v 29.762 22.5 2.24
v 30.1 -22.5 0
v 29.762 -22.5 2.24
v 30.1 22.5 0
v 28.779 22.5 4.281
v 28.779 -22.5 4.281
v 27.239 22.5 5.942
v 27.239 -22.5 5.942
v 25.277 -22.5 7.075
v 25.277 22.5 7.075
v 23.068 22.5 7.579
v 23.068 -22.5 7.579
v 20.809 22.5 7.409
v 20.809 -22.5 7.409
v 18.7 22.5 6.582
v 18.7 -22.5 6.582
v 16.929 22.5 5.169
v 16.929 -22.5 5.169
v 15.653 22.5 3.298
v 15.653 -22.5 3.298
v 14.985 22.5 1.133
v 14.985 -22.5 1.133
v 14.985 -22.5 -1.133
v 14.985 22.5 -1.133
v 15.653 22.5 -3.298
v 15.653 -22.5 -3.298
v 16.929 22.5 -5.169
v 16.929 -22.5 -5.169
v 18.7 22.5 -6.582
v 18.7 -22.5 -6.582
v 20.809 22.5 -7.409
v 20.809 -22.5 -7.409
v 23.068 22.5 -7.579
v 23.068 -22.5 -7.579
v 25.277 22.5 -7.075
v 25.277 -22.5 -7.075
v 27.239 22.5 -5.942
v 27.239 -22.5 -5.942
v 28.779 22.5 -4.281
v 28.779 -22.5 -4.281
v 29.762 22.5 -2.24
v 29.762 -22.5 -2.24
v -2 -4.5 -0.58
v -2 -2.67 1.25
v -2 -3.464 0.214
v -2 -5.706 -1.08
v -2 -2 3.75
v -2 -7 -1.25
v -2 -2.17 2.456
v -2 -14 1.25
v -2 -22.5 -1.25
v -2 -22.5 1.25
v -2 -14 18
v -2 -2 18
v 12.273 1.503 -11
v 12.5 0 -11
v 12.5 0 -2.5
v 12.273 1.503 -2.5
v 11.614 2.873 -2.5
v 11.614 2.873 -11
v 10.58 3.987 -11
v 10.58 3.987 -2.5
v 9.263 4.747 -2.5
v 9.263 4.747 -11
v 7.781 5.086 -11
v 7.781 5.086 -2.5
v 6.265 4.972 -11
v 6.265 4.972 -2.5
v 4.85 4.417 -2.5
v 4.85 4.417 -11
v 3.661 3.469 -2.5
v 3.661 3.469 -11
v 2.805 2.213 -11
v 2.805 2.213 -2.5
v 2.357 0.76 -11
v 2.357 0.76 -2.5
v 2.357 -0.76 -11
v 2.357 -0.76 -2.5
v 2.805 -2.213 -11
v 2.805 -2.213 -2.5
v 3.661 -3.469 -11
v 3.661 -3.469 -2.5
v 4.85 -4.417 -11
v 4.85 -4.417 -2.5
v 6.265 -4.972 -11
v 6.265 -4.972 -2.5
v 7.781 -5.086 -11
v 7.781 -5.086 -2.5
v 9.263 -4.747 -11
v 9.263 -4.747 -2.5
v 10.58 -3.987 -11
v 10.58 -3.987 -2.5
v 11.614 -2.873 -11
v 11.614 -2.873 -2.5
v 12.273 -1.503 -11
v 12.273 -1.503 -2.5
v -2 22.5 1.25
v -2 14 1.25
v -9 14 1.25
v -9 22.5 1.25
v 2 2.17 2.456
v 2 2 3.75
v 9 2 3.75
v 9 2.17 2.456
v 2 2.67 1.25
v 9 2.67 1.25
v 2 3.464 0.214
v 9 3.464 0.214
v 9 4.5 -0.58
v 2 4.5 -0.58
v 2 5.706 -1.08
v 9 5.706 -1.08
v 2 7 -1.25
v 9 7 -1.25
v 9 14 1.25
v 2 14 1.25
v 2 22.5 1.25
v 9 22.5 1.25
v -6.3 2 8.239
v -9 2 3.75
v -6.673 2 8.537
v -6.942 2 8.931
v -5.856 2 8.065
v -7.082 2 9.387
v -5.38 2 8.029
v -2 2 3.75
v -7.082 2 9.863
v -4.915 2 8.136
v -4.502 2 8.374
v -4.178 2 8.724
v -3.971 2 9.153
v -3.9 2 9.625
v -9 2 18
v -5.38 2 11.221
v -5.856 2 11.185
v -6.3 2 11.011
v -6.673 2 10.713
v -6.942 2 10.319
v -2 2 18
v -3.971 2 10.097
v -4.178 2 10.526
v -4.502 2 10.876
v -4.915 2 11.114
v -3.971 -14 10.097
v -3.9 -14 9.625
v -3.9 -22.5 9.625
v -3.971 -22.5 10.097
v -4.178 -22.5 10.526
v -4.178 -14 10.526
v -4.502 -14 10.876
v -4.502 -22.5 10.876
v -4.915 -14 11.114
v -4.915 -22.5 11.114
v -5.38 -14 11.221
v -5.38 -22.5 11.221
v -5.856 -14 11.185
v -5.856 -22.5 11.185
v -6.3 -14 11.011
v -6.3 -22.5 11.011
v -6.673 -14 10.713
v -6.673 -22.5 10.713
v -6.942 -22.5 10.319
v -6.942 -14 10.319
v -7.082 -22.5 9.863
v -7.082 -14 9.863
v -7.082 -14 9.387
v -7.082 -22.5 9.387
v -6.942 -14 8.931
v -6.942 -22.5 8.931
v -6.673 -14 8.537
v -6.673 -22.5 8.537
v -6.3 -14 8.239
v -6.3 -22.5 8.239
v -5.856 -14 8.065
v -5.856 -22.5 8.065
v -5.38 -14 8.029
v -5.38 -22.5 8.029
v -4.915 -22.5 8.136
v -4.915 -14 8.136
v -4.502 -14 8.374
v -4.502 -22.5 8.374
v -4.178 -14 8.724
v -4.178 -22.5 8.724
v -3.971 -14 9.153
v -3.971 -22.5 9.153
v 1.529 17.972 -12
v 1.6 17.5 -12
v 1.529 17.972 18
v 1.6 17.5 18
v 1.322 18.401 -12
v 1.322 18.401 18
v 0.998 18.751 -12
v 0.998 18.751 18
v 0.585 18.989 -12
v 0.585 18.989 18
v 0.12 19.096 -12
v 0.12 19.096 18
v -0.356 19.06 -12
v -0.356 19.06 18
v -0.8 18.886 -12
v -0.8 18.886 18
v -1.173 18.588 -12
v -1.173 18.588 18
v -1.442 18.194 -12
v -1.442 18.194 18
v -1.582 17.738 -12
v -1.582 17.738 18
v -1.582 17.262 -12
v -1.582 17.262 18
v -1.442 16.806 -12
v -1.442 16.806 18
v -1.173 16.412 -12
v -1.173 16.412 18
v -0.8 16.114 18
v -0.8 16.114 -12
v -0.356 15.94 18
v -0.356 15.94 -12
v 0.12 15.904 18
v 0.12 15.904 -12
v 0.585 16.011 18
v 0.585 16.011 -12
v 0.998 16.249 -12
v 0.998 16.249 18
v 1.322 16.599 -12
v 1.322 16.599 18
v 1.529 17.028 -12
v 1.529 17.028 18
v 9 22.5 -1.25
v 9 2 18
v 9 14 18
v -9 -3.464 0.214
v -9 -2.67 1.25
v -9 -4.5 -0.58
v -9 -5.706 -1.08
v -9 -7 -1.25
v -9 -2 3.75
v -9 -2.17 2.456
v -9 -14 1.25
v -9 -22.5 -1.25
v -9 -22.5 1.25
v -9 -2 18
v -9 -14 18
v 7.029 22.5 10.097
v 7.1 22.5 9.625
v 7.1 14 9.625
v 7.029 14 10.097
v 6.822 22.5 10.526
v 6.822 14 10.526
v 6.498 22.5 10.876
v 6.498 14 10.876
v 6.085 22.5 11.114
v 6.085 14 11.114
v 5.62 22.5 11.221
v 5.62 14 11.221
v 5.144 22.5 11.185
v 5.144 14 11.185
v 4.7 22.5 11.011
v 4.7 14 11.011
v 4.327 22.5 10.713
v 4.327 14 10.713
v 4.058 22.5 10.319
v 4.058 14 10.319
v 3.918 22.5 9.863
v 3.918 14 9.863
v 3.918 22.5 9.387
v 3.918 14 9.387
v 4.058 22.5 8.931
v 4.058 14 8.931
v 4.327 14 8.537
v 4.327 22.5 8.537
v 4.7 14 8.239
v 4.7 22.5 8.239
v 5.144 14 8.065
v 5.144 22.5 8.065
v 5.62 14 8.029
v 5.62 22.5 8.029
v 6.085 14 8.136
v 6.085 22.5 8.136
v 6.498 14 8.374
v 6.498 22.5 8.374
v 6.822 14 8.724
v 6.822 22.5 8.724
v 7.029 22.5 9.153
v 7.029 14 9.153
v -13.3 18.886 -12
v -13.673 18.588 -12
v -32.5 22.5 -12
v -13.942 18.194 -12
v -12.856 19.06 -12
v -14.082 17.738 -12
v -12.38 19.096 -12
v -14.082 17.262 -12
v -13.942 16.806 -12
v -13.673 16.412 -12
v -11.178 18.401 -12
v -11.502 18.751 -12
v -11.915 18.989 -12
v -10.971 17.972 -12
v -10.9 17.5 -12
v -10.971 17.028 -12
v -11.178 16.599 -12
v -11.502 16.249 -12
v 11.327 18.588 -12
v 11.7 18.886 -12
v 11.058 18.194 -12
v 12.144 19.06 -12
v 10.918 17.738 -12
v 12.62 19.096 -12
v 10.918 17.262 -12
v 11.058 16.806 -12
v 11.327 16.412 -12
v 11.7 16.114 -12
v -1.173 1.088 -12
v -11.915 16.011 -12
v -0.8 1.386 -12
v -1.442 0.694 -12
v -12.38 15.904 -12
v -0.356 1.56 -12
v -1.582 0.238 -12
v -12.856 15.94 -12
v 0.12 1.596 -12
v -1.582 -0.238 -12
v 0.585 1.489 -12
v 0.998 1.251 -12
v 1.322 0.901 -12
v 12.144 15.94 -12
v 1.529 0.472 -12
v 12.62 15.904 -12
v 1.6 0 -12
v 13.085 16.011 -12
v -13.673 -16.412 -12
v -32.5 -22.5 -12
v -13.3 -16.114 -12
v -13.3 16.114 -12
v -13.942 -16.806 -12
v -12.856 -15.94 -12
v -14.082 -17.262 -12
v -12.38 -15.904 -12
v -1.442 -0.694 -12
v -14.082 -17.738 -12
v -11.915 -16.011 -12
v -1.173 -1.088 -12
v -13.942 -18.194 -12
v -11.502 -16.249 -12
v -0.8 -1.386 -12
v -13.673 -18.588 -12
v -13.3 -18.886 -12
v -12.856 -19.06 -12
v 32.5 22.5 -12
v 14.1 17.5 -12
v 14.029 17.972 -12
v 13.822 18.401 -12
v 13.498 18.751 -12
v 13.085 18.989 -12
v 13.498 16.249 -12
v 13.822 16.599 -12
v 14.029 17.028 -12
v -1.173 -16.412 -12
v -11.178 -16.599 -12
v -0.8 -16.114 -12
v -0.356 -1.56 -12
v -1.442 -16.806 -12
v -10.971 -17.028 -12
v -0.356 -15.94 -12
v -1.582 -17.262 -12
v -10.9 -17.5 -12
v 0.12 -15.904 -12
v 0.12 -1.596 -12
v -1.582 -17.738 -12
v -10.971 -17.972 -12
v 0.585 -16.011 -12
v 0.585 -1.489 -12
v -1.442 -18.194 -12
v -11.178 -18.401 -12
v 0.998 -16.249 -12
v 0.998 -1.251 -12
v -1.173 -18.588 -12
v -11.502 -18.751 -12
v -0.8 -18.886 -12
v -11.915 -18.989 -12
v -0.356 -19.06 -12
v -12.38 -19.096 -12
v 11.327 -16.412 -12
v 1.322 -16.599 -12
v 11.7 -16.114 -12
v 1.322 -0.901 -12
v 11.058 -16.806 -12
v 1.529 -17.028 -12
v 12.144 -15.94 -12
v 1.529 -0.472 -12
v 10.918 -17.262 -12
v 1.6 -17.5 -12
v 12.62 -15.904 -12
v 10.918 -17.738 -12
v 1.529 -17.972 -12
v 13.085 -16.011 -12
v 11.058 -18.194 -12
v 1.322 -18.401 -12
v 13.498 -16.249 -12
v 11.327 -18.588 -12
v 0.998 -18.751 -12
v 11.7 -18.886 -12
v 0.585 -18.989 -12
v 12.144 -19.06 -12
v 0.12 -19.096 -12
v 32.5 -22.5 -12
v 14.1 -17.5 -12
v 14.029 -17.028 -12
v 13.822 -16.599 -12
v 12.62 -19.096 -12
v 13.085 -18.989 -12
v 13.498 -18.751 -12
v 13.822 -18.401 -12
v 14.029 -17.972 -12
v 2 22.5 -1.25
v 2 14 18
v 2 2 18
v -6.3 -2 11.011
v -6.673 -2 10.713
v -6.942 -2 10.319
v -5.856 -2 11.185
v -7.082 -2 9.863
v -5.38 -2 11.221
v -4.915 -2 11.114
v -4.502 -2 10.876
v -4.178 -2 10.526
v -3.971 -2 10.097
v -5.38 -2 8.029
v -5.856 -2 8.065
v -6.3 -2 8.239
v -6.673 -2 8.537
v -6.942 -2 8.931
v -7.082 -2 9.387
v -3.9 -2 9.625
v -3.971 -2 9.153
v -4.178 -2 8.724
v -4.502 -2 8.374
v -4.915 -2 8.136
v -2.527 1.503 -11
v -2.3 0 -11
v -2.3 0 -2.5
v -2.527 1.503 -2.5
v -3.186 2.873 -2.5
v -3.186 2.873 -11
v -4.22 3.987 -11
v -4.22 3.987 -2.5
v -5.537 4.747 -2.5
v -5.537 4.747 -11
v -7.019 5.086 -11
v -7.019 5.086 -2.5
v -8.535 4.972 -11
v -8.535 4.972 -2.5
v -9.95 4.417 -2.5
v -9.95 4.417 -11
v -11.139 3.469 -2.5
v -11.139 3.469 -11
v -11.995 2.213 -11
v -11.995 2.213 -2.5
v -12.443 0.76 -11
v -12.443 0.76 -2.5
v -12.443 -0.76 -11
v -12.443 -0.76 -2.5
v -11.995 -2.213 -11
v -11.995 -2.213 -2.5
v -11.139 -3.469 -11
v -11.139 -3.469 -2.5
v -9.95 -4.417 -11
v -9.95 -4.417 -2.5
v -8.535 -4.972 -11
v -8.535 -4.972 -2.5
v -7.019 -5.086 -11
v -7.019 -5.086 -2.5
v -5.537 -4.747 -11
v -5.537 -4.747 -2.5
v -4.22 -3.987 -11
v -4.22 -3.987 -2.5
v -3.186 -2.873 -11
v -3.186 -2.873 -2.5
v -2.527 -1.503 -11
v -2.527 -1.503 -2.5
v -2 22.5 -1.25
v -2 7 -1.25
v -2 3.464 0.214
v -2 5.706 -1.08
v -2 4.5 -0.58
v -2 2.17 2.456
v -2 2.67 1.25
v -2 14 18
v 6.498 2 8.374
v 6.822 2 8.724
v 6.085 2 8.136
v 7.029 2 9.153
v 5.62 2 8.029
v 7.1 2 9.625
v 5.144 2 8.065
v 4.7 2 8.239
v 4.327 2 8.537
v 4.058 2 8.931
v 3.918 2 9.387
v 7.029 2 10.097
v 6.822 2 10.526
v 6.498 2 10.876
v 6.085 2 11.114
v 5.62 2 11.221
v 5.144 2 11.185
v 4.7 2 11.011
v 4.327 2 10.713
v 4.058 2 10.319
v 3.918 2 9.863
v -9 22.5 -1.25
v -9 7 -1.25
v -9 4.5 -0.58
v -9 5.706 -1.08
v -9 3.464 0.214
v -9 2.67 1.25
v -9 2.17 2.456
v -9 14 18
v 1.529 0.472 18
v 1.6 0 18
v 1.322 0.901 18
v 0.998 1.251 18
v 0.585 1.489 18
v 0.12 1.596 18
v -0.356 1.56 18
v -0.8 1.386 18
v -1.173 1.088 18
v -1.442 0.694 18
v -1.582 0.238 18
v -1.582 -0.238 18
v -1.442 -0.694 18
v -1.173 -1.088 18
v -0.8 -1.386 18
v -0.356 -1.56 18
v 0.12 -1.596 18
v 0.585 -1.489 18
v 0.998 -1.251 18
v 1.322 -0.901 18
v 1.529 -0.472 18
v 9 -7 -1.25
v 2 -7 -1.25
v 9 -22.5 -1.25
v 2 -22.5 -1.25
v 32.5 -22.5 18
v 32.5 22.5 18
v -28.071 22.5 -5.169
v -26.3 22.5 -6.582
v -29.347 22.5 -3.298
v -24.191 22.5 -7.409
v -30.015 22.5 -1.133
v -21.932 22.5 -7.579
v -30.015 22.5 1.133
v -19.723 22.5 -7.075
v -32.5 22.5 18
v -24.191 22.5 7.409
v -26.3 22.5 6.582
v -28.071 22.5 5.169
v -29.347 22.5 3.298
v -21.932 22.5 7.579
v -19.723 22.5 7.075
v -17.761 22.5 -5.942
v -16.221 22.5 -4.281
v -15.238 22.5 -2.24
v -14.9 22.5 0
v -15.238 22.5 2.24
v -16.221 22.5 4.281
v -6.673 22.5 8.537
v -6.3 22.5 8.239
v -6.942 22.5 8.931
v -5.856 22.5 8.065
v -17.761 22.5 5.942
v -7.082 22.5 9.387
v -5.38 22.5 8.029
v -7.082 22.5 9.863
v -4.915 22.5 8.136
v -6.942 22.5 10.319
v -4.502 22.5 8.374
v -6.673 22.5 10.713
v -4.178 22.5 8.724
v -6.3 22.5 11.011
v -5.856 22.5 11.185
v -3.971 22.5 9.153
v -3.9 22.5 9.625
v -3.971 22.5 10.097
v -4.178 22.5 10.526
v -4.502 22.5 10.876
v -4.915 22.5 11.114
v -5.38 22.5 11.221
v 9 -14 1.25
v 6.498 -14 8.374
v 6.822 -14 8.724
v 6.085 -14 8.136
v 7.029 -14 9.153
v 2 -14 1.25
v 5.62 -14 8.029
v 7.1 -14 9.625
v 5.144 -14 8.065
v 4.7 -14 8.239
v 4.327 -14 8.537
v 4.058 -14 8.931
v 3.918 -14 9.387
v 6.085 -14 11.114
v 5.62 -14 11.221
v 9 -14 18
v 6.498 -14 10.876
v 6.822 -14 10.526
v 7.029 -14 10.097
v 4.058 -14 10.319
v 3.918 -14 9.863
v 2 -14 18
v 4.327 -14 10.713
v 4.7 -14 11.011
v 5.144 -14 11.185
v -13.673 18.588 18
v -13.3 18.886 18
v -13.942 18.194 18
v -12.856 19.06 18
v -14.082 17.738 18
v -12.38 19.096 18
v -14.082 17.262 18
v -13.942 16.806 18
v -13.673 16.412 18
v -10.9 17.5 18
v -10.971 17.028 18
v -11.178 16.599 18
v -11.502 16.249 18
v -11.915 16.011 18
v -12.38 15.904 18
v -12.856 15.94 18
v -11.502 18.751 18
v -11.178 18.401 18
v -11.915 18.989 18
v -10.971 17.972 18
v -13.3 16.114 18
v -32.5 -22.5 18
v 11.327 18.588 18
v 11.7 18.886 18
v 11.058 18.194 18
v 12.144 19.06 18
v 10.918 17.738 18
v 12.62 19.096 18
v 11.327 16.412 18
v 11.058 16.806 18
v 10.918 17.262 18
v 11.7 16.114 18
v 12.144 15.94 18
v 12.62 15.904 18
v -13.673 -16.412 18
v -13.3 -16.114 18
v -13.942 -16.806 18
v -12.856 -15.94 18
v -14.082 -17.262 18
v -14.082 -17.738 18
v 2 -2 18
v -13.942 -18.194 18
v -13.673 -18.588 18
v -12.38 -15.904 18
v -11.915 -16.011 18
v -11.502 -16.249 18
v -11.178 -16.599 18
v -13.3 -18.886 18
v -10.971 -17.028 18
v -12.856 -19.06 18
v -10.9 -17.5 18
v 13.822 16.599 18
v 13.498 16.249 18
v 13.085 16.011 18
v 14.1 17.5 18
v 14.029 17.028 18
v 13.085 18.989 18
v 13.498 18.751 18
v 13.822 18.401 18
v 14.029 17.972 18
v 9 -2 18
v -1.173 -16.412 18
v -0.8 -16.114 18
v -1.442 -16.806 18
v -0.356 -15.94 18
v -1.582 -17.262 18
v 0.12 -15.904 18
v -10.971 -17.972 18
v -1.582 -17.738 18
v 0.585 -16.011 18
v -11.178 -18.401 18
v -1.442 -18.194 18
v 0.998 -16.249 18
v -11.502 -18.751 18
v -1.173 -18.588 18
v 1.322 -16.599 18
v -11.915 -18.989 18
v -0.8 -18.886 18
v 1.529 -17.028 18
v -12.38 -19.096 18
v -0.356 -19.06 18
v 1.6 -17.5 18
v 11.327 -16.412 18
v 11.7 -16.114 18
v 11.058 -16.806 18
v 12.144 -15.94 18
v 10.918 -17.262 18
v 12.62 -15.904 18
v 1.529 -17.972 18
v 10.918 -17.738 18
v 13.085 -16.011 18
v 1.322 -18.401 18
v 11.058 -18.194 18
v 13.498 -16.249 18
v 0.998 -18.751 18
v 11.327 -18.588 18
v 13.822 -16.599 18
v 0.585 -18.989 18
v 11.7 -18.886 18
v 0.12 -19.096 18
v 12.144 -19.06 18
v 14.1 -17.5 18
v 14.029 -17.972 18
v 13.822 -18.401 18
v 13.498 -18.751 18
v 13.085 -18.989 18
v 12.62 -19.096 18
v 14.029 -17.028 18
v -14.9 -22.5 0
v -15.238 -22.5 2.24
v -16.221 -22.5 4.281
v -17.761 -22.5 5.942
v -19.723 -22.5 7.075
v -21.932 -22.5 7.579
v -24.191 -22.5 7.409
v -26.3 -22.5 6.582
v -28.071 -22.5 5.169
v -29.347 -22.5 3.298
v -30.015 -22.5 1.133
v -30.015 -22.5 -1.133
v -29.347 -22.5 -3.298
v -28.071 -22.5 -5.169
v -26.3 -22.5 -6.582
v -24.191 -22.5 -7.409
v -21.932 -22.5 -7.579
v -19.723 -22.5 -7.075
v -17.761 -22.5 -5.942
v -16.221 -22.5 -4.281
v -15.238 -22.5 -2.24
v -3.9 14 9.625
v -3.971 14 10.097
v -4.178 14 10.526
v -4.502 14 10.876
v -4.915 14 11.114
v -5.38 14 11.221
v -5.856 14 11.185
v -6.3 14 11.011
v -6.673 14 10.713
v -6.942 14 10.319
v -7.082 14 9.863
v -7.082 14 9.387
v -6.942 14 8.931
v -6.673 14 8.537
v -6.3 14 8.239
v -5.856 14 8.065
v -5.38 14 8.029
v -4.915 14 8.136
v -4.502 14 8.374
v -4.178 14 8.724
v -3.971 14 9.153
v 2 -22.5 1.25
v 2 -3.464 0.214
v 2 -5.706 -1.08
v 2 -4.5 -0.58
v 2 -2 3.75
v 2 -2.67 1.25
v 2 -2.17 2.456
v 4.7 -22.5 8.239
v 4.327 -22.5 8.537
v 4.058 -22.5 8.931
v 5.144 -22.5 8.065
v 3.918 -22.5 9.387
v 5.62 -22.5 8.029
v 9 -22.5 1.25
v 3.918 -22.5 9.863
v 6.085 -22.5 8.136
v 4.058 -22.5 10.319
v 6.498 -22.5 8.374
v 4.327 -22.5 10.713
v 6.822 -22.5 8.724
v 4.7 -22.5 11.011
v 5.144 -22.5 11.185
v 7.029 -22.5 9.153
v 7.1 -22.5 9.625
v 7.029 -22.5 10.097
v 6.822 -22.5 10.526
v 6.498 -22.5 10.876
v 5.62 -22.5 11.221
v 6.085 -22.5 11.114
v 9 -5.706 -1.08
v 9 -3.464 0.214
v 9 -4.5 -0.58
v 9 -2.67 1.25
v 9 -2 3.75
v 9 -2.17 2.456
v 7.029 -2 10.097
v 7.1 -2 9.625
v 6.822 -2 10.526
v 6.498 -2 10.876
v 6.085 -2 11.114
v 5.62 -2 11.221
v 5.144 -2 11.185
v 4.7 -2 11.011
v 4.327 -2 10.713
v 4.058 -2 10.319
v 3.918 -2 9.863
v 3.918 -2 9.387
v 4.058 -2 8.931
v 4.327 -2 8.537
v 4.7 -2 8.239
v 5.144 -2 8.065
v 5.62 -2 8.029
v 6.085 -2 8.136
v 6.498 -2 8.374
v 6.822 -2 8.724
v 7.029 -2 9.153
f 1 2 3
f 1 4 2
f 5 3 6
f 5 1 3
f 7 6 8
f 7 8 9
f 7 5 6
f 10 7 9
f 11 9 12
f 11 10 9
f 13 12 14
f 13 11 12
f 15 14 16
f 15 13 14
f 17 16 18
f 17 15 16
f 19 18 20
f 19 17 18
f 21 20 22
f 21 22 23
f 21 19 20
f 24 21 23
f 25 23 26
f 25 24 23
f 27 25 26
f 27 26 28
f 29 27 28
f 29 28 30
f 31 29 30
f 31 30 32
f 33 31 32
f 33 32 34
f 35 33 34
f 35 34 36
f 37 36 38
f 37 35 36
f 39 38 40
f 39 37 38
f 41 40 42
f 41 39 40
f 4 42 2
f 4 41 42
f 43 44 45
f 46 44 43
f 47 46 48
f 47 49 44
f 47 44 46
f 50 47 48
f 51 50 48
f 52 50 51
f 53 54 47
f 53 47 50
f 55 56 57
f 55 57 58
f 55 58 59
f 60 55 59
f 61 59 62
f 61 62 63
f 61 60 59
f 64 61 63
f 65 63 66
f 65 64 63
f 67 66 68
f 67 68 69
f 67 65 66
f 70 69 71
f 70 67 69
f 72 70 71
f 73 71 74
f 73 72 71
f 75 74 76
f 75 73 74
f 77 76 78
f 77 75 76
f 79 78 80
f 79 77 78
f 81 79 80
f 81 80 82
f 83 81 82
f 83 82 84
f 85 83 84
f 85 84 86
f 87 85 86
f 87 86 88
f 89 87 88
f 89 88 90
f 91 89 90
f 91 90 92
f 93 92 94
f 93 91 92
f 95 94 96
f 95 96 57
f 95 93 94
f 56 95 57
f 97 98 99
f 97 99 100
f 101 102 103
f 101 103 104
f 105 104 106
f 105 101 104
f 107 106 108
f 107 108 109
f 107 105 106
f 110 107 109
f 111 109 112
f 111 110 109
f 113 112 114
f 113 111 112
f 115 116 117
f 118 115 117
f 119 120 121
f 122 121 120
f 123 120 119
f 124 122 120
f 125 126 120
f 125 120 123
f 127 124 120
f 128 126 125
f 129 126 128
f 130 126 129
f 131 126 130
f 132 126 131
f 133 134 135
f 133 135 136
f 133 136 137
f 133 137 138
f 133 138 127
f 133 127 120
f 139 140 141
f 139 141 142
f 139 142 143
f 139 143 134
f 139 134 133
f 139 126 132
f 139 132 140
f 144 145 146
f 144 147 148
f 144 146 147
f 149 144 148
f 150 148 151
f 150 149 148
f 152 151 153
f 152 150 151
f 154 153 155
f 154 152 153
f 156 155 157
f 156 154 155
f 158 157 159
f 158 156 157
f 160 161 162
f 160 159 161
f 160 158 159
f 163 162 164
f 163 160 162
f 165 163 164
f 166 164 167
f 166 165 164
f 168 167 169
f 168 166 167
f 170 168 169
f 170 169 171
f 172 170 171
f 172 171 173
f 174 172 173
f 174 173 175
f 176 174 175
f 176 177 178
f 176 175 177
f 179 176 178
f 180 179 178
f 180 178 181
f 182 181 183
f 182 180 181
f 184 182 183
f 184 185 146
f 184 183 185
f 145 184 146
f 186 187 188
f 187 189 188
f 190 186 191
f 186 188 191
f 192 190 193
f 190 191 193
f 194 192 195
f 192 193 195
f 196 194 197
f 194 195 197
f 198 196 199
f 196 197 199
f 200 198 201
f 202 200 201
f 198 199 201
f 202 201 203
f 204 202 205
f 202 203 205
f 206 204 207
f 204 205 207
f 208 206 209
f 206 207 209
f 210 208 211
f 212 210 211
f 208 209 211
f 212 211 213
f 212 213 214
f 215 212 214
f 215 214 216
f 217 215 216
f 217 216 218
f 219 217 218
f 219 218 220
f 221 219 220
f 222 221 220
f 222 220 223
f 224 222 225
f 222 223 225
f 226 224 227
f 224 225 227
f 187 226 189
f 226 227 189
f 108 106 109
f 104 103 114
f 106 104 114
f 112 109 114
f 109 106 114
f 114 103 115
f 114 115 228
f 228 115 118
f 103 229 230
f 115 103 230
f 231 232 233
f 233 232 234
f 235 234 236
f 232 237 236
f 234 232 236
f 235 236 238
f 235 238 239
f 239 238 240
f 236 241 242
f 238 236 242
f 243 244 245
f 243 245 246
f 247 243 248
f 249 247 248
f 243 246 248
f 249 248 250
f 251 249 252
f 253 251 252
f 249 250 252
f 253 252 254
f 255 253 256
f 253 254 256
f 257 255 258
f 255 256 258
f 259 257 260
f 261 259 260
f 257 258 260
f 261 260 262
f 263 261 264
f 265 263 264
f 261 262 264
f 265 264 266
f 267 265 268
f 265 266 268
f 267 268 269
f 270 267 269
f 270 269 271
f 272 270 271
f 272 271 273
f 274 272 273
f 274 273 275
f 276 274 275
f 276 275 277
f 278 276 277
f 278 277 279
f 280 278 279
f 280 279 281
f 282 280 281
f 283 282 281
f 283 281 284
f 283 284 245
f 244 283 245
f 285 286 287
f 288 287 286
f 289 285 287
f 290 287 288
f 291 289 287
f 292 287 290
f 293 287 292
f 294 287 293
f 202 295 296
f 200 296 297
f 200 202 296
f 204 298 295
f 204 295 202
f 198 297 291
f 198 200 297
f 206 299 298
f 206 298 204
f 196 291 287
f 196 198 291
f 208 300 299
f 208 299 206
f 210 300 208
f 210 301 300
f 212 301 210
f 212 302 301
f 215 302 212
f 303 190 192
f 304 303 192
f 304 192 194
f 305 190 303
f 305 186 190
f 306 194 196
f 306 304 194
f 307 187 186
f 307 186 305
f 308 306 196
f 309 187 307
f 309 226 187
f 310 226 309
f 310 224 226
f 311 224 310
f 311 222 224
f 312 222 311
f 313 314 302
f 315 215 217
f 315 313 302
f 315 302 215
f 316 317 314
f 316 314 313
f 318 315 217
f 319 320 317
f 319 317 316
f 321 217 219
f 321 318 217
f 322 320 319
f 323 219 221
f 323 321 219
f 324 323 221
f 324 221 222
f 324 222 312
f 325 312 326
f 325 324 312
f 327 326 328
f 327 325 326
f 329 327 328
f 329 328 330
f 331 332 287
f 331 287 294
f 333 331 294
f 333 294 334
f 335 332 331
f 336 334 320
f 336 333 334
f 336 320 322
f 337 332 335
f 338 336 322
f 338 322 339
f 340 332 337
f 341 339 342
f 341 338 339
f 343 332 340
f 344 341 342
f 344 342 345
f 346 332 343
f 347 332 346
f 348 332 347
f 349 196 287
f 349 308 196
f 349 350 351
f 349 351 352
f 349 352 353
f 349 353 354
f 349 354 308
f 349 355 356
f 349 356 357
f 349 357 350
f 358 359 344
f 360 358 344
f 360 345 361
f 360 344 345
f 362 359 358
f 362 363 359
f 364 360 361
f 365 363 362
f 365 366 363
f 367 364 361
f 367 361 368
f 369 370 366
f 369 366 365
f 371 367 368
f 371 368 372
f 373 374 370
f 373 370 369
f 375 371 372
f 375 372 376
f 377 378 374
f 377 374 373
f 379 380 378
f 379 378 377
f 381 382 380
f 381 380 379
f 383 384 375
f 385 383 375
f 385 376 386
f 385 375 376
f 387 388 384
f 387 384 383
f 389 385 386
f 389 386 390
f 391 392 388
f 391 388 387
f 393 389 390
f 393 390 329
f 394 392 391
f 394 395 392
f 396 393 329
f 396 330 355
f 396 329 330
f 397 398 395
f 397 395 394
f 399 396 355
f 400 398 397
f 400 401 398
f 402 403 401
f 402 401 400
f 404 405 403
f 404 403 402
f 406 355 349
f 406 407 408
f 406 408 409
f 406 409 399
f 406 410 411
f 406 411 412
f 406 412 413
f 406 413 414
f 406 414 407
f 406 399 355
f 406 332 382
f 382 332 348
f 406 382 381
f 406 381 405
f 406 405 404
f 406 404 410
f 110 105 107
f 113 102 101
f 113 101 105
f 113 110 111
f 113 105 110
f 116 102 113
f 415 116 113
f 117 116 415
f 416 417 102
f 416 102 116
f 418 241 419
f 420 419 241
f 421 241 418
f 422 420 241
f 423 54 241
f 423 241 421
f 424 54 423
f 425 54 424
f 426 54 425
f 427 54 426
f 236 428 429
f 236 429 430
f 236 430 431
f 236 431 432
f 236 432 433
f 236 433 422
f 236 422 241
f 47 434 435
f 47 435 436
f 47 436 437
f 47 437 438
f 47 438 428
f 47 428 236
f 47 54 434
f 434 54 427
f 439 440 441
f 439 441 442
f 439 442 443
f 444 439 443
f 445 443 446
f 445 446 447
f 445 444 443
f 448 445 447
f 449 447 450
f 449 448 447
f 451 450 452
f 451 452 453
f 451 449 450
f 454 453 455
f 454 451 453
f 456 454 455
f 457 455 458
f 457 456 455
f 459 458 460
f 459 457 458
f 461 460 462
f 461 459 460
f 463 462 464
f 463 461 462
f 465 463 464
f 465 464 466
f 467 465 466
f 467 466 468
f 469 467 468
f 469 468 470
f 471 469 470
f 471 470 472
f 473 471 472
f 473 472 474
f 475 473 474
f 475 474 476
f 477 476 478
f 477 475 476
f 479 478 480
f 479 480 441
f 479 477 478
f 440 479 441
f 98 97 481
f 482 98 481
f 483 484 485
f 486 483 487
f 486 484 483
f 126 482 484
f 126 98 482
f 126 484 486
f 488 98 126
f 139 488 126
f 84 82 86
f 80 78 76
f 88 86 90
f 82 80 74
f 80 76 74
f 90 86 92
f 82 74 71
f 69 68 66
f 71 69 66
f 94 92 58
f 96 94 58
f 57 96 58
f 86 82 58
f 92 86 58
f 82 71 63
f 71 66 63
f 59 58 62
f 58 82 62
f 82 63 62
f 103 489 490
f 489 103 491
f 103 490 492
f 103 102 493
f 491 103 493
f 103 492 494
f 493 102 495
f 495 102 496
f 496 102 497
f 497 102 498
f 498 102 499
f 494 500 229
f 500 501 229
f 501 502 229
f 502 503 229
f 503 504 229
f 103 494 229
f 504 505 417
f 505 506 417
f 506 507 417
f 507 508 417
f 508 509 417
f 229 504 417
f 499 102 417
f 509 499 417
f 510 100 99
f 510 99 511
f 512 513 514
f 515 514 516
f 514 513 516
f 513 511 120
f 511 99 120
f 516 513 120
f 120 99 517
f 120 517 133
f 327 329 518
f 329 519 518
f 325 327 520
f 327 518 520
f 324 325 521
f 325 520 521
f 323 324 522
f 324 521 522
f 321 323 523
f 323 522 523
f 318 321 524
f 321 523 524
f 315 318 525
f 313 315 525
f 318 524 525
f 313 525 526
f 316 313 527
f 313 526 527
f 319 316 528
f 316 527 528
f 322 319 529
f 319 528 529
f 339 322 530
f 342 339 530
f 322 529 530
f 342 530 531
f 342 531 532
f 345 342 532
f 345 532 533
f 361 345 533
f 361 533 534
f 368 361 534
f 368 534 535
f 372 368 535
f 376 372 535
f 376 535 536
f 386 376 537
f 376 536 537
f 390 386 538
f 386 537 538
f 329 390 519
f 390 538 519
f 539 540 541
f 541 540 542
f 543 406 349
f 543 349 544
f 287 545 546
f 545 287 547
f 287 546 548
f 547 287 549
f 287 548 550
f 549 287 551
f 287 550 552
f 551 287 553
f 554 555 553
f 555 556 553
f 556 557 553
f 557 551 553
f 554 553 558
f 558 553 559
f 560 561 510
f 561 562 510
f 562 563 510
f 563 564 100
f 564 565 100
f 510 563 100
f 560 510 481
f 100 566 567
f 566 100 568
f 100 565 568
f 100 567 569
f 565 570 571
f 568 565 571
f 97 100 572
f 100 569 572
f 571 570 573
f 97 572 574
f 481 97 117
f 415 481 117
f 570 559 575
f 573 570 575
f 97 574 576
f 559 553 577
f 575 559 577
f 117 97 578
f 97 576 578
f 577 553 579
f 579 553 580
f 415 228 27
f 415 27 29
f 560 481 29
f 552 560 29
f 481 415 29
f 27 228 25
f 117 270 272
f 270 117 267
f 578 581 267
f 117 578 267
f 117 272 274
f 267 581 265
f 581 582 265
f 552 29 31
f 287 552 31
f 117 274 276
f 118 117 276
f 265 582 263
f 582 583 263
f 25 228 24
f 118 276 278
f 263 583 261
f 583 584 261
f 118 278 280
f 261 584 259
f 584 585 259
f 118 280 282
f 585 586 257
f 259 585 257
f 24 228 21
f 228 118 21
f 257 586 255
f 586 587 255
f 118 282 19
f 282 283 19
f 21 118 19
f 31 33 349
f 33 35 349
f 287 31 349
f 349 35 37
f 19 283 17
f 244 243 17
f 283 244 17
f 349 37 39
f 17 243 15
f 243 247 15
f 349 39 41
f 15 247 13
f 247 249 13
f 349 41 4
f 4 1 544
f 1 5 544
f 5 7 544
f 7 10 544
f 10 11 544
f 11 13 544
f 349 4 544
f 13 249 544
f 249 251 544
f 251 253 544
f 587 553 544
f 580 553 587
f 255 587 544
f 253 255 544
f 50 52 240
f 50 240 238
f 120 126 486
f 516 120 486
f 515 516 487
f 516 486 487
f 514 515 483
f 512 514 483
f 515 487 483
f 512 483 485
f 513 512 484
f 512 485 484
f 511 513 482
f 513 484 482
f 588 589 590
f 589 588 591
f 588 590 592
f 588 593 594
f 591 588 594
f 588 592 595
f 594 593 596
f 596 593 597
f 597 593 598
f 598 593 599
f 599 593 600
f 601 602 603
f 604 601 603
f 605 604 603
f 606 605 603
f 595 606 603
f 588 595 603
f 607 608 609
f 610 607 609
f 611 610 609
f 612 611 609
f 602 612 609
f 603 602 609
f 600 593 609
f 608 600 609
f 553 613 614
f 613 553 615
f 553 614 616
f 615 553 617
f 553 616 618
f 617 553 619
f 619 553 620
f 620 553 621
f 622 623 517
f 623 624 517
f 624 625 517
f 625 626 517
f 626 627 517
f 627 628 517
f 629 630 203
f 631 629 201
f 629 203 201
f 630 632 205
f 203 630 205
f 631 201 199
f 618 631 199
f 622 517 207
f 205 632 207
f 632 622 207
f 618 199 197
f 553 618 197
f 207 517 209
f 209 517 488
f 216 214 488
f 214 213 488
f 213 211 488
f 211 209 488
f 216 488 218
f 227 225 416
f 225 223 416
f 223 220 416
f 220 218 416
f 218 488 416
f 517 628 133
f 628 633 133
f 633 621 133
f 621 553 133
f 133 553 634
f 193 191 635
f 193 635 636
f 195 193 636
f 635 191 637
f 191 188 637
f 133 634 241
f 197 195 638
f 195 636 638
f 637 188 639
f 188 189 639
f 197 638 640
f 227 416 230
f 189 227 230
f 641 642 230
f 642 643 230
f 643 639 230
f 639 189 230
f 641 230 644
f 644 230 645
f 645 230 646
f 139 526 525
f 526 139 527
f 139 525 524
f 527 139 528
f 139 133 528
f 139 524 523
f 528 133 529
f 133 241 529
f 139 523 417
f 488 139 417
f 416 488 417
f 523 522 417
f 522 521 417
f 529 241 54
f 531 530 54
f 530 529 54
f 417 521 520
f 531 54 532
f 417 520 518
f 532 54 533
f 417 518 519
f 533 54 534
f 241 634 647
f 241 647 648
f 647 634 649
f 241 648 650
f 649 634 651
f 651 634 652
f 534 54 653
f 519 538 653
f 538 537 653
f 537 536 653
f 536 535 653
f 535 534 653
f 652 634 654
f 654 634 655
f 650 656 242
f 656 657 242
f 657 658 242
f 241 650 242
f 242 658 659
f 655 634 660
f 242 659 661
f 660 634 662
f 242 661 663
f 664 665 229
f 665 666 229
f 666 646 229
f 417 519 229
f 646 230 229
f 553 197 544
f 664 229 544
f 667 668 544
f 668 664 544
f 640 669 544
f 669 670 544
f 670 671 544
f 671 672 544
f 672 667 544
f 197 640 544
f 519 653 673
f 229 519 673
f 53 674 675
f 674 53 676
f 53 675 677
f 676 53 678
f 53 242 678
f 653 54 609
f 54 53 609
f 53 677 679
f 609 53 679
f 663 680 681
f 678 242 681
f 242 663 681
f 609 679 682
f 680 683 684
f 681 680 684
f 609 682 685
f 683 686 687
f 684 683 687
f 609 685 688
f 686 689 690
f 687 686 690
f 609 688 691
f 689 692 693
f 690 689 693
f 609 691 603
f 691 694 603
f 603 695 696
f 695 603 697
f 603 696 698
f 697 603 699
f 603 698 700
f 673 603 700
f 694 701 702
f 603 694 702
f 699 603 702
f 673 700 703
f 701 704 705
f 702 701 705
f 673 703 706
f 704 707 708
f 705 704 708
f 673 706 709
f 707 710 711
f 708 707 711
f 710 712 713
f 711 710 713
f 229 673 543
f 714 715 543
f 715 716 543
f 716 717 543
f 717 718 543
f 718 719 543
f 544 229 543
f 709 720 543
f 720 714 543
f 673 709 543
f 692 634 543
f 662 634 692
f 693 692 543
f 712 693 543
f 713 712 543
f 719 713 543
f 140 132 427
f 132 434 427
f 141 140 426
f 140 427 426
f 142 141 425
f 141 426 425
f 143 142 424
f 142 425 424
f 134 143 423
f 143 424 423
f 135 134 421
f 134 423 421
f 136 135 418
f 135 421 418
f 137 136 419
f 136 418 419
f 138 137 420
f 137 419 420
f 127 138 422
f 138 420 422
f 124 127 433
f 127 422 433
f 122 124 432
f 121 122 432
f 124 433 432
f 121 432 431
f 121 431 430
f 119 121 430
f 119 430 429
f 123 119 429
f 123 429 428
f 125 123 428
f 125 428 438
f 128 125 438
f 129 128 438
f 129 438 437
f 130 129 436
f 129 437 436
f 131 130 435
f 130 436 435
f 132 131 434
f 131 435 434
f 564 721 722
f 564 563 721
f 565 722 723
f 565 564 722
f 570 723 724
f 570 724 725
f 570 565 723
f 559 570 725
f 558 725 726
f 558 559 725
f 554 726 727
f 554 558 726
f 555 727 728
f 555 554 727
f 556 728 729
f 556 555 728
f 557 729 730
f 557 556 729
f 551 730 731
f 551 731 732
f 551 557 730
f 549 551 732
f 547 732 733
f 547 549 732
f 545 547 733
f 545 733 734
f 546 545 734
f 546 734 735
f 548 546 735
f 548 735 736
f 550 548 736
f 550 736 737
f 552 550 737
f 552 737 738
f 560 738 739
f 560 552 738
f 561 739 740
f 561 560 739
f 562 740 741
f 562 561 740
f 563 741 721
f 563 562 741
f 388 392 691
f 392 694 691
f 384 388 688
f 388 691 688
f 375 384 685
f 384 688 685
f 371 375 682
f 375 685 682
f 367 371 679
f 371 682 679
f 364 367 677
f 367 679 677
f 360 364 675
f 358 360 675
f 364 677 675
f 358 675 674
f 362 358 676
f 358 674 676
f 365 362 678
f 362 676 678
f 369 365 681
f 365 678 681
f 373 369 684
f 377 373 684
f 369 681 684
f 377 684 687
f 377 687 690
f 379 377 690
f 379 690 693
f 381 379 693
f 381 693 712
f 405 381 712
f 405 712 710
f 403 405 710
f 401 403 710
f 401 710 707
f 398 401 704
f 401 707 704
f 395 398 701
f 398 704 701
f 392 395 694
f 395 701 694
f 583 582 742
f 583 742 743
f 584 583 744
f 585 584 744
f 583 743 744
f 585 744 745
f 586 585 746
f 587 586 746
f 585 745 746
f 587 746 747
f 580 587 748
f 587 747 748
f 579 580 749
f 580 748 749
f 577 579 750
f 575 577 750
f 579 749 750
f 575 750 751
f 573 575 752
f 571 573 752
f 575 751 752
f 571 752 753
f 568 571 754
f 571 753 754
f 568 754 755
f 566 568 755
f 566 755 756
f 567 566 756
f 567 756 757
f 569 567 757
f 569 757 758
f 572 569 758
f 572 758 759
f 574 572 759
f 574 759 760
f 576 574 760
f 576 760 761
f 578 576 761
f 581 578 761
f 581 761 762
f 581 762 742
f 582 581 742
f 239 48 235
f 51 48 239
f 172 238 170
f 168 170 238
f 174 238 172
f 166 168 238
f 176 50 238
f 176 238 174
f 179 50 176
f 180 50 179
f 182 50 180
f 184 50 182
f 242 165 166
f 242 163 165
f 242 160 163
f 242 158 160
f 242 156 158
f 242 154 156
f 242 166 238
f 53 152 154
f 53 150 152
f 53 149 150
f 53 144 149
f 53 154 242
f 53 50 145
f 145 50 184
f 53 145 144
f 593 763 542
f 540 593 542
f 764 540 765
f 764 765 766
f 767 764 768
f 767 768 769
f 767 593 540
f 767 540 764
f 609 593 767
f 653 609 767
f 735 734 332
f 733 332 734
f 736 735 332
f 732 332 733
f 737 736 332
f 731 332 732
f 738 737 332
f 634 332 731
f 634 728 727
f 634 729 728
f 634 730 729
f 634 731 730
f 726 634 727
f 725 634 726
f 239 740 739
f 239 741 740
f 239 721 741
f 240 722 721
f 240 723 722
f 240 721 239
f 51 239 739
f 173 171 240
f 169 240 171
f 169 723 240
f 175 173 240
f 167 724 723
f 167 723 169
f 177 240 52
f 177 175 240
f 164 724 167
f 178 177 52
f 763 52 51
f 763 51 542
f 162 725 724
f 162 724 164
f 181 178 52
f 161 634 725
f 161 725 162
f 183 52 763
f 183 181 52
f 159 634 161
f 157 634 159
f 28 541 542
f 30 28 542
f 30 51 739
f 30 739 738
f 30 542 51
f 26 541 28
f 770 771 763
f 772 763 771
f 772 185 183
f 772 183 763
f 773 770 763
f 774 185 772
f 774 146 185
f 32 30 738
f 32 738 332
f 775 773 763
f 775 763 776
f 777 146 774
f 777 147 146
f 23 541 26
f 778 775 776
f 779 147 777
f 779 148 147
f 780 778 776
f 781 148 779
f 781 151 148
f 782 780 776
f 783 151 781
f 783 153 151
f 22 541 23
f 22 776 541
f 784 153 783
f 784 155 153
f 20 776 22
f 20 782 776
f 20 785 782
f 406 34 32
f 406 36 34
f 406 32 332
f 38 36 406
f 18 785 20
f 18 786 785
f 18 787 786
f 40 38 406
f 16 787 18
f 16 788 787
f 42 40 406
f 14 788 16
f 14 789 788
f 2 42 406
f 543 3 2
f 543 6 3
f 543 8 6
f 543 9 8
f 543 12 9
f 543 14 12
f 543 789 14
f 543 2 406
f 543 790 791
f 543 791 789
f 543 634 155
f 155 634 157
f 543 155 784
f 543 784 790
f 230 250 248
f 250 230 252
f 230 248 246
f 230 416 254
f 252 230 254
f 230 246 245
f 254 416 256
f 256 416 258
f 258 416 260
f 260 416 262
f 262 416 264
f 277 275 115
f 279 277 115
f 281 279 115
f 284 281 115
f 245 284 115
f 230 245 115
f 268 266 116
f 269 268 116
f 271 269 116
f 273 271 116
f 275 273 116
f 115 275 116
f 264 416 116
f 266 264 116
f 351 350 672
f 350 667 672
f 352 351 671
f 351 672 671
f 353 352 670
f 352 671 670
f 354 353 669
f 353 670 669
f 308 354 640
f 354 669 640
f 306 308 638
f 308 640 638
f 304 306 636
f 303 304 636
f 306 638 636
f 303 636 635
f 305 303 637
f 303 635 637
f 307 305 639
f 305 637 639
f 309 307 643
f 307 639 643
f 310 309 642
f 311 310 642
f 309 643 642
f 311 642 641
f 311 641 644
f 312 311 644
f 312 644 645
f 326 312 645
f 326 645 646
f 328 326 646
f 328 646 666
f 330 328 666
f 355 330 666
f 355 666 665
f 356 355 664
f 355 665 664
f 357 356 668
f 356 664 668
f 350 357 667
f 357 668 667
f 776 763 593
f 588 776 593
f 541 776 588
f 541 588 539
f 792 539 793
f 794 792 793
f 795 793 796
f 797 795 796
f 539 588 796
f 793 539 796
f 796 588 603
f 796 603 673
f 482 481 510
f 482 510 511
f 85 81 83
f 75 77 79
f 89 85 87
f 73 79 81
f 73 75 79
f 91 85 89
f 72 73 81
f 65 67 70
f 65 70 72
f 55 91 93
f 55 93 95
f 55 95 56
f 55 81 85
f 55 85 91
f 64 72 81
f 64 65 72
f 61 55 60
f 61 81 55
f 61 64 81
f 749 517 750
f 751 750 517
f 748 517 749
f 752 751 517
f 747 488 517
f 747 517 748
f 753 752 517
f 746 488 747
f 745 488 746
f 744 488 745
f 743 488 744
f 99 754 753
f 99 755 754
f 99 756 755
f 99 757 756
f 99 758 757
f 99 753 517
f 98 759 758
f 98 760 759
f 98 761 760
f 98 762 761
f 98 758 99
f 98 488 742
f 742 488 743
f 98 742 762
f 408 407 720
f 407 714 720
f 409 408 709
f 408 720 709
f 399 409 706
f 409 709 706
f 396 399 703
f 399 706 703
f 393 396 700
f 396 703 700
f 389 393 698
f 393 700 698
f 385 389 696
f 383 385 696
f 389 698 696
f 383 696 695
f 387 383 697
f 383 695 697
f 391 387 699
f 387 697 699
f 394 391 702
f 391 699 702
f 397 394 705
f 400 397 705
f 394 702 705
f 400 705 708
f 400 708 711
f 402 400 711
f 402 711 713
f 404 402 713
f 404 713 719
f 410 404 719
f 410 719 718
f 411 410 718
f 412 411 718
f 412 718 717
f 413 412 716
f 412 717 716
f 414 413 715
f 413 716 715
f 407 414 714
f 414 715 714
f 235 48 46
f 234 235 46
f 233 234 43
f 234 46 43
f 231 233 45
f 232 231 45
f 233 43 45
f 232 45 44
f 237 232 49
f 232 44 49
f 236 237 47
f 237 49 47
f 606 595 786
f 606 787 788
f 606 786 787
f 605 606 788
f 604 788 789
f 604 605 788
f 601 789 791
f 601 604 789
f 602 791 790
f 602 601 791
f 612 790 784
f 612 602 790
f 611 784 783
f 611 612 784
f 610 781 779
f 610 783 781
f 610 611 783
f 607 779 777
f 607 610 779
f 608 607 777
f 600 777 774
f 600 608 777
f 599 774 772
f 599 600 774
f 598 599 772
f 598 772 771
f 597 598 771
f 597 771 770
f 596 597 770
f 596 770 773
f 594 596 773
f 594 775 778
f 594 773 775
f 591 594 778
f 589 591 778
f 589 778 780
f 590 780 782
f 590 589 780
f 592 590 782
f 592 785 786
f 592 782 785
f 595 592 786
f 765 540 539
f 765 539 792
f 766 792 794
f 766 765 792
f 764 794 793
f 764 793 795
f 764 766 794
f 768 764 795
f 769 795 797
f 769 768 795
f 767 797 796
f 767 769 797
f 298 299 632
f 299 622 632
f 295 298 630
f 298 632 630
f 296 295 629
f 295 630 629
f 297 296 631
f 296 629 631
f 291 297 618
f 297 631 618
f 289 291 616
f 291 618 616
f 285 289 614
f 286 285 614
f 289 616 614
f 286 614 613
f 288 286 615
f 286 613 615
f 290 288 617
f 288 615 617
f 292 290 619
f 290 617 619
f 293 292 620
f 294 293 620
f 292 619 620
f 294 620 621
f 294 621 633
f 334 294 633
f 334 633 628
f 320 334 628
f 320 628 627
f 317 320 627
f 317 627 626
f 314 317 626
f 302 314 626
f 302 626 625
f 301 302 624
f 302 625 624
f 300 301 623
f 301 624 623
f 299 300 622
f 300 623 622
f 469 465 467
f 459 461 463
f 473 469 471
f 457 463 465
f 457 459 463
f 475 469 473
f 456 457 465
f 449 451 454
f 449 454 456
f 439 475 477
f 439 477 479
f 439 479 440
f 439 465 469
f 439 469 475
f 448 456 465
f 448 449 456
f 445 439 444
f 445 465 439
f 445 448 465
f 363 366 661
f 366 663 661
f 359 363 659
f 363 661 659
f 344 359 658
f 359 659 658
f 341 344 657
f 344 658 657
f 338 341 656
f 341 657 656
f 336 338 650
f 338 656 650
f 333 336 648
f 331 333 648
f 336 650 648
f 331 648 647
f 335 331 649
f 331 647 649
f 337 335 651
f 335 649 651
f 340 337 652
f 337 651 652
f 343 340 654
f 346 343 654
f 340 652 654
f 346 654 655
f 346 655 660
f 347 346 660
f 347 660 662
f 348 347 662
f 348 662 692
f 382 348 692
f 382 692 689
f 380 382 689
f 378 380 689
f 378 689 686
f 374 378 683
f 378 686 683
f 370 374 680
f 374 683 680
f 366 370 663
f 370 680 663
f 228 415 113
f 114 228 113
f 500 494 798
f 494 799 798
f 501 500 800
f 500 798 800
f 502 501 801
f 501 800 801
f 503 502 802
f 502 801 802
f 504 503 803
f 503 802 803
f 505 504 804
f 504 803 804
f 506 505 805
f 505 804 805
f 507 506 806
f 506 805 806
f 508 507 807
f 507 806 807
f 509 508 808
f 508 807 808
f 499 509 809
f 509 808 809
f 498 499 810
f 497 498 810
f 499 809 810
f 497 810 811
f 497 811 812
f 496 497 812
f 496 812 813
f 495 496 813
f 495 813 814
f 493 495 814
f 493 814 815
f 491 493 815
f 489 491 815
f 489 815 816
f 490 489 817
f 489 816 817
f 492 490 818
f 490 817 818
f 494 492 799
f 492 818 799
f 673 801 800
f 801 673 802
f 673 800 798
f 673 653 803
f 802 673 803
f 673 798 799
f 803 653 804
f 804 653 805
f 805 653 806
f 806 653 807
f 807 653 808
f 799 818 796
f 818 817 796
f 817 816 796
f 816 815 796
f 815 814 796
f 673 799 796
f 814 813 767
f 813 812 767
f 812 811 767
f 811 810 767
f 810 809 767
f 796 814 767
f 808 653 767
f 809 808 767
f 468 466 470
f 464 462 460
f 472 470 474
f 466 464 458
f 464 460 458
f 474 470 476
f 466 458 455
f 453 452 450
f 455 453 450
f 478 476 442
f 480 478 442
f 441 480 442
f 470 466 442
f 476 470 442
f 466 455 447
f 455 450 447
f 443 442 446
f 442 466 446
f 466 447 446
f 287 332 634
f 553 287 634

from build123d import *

# Parameters (mm, degrees)
SKETCH_W             = 65
SKETCH_H             = 30
SKETCH_R             = 7.6
PAD_DEPTH            = 22.5
SKETCH001_R          = 1.6
POCKET_DEPTH         = 12.001
POCKET_DEPTH_BACK    = -18.001
POCKET001_DEPTH      = 7
POCKET002_DEPTH      = 7
SKETCH004_R          = 5.1
POCKET003_DEPTH      = 8.5
SKETCH005_R          = 1.6
POCKET004_DEPTH      = 22.501
POCKET004_DEPTH_BACK = -22.501


with BuildPart() as part:
    # Sketch → Pad (new body, symmetric)
    with BuildSketch(Plane.XZ):
        with Locations((0, 3)):
            Rectangle(SKETCH_W, SKETCH_H)
        with Locations((-22.5, 0)):
            Circle(SKETCH_R, mode=Mode.SUBTRACT)
        with Locations((22.5, 0)):
            Circle(SKETCH_R, mode=Mode.SUBTRACT)
    extrude(amount=PAD_DEPTH, both=True)

    # Sketch001 → Pocket (cut, two sides)
    with BuildSketch(Plane.XY) as pocket_sk:
        with Locations((-12.5, 17.5)):
            Circle(SKETCH001_R)
        with Locations((12.5, 17.5)):
            Circle(SKETCH001_R)
        Circle(SKETCH001_R)
        with Locations((-12.5, -17.5)):
            Circle(SKETCH001_R)
        with Locations((12.5, -17.5)):
            Circle(SKETCH001_R)
        with Locations((0, 17.5)):
            Circle(SKETCH001_R)
        with Locations((0, -17.5)):
            Circle(SKETCH001_R)
    extrude(amount=-POCKET_DEPTH, mode=Mode.SUBTRACT)
    extrude(pocket_sk.sketch, amount=-POCKET_DEPTH_BACK, mode=Mode.SUBTRACT)

    # Sketch002 (on DatumPlane) → Pocket001 (cut)
    with BuildSketch(Plane.YZ.offset(2)):
        with BuildLine():
            ThreePointArc((-7, -1.25), (-3.464466, 0.214466), (-2, 3.75))
            Line((-2, 18), (-2, 3.75))
            Line((-14, 18), (-2, 18))
            Line((-14, 1.25), (-14, 18))
            Line((-22.5, 1.25), (-14, 1.25))
            Line((-22.5, -1.25), (-22.5, 1.25))
            Line((-7, -1.25), (-22.5, -1.25))
        make_face()
        with BuildLine():
            ThreePointArc((2, 3.75), (3.464466, 0.214466), (7, -1.25))
            Line((22.5, -1.25), (7, -1.25))
            Line((22.5, 1.25), (22.5, -1.25))
            Line((14, 1.25), (22.5, 1.25))
            Line((14, 18), (14, 1.25))
            Line((2, 18), (14, 18))
            Line((2, 3.75), (2, 18))
        make_face()
    extrude(amount=POCKET001_DEPTH, mode=Mode.SUBTRACT)

    # Sketch003 (on DatumPlane) → Pocket002 (cut)
    with BuildSketch(Plane.YZ.offset(-2)):
        with BuildLine():
            Line((-7, -1.25), (-22.5, -1.25))
            Line((-22.5, -1.25), (-22.5, 1.25))
            Line((-22.5, 1.25), (-14, 1.25))
            Line((-14, 1.25), (-14, 18))
            Line((-14, 18), (-2, 18))
            Line((-2, 18), (-2, 3.75))
            ThreePointArc((-7, -1.25), (-3.464466, 0.214466), (-2, 3.75))
        make_face()
        with BuildLine():
            Line((2, 3.75), (2, 18))
            Line((2, 18), (14, 18))
            Line((14, 18), (14, 1.25))
            Line((14, 1.25), (22.5, 1.25))
            Line((22.5, 1.25), (22.5, -1.25))
            Line((22.5, -1.25), (7, -1.25))
            ThreePointArc((2, 3.75), (3.464466, 0.214466), (7, -1.25))
        make_face()
    extrude(amount=-POCKET002_DEPTH, mode=Mode.SUBTRACT)

    # Sketch004 (on DatumPlane) → Pocket003 (cut)
    with BuildSketch(Plane.XY.offset(-11)):
        with Locations((-7.4, 0)):
            Circle(SKETCH004_R)
        with Locations((7.4, 0)):
            Circle(SKETCH004_R)
    extrude(amount=POCKET003_DEPTH, mode=Mode.SUBTRACT)

    # Sketch005 → Pocket004 (cut, two sides)
    with BuildSketch(Plane.XZ) as pocket004_sk:
        with Locations((-5.5, 9.625)):
            Circle(SKETCH005_R)
        with Locations((5.5, 9.625)):
            Circle(SKETCH005_R)
    extrude(amount=-POCKET004_DEPTH, mode=Mode.SUBTRACT)
    extrude(pocket004_sk.sketch, amount=-POCKET004_DEPTH_BACK, mode=Mode.SUBTRACT)


solid = part.part
